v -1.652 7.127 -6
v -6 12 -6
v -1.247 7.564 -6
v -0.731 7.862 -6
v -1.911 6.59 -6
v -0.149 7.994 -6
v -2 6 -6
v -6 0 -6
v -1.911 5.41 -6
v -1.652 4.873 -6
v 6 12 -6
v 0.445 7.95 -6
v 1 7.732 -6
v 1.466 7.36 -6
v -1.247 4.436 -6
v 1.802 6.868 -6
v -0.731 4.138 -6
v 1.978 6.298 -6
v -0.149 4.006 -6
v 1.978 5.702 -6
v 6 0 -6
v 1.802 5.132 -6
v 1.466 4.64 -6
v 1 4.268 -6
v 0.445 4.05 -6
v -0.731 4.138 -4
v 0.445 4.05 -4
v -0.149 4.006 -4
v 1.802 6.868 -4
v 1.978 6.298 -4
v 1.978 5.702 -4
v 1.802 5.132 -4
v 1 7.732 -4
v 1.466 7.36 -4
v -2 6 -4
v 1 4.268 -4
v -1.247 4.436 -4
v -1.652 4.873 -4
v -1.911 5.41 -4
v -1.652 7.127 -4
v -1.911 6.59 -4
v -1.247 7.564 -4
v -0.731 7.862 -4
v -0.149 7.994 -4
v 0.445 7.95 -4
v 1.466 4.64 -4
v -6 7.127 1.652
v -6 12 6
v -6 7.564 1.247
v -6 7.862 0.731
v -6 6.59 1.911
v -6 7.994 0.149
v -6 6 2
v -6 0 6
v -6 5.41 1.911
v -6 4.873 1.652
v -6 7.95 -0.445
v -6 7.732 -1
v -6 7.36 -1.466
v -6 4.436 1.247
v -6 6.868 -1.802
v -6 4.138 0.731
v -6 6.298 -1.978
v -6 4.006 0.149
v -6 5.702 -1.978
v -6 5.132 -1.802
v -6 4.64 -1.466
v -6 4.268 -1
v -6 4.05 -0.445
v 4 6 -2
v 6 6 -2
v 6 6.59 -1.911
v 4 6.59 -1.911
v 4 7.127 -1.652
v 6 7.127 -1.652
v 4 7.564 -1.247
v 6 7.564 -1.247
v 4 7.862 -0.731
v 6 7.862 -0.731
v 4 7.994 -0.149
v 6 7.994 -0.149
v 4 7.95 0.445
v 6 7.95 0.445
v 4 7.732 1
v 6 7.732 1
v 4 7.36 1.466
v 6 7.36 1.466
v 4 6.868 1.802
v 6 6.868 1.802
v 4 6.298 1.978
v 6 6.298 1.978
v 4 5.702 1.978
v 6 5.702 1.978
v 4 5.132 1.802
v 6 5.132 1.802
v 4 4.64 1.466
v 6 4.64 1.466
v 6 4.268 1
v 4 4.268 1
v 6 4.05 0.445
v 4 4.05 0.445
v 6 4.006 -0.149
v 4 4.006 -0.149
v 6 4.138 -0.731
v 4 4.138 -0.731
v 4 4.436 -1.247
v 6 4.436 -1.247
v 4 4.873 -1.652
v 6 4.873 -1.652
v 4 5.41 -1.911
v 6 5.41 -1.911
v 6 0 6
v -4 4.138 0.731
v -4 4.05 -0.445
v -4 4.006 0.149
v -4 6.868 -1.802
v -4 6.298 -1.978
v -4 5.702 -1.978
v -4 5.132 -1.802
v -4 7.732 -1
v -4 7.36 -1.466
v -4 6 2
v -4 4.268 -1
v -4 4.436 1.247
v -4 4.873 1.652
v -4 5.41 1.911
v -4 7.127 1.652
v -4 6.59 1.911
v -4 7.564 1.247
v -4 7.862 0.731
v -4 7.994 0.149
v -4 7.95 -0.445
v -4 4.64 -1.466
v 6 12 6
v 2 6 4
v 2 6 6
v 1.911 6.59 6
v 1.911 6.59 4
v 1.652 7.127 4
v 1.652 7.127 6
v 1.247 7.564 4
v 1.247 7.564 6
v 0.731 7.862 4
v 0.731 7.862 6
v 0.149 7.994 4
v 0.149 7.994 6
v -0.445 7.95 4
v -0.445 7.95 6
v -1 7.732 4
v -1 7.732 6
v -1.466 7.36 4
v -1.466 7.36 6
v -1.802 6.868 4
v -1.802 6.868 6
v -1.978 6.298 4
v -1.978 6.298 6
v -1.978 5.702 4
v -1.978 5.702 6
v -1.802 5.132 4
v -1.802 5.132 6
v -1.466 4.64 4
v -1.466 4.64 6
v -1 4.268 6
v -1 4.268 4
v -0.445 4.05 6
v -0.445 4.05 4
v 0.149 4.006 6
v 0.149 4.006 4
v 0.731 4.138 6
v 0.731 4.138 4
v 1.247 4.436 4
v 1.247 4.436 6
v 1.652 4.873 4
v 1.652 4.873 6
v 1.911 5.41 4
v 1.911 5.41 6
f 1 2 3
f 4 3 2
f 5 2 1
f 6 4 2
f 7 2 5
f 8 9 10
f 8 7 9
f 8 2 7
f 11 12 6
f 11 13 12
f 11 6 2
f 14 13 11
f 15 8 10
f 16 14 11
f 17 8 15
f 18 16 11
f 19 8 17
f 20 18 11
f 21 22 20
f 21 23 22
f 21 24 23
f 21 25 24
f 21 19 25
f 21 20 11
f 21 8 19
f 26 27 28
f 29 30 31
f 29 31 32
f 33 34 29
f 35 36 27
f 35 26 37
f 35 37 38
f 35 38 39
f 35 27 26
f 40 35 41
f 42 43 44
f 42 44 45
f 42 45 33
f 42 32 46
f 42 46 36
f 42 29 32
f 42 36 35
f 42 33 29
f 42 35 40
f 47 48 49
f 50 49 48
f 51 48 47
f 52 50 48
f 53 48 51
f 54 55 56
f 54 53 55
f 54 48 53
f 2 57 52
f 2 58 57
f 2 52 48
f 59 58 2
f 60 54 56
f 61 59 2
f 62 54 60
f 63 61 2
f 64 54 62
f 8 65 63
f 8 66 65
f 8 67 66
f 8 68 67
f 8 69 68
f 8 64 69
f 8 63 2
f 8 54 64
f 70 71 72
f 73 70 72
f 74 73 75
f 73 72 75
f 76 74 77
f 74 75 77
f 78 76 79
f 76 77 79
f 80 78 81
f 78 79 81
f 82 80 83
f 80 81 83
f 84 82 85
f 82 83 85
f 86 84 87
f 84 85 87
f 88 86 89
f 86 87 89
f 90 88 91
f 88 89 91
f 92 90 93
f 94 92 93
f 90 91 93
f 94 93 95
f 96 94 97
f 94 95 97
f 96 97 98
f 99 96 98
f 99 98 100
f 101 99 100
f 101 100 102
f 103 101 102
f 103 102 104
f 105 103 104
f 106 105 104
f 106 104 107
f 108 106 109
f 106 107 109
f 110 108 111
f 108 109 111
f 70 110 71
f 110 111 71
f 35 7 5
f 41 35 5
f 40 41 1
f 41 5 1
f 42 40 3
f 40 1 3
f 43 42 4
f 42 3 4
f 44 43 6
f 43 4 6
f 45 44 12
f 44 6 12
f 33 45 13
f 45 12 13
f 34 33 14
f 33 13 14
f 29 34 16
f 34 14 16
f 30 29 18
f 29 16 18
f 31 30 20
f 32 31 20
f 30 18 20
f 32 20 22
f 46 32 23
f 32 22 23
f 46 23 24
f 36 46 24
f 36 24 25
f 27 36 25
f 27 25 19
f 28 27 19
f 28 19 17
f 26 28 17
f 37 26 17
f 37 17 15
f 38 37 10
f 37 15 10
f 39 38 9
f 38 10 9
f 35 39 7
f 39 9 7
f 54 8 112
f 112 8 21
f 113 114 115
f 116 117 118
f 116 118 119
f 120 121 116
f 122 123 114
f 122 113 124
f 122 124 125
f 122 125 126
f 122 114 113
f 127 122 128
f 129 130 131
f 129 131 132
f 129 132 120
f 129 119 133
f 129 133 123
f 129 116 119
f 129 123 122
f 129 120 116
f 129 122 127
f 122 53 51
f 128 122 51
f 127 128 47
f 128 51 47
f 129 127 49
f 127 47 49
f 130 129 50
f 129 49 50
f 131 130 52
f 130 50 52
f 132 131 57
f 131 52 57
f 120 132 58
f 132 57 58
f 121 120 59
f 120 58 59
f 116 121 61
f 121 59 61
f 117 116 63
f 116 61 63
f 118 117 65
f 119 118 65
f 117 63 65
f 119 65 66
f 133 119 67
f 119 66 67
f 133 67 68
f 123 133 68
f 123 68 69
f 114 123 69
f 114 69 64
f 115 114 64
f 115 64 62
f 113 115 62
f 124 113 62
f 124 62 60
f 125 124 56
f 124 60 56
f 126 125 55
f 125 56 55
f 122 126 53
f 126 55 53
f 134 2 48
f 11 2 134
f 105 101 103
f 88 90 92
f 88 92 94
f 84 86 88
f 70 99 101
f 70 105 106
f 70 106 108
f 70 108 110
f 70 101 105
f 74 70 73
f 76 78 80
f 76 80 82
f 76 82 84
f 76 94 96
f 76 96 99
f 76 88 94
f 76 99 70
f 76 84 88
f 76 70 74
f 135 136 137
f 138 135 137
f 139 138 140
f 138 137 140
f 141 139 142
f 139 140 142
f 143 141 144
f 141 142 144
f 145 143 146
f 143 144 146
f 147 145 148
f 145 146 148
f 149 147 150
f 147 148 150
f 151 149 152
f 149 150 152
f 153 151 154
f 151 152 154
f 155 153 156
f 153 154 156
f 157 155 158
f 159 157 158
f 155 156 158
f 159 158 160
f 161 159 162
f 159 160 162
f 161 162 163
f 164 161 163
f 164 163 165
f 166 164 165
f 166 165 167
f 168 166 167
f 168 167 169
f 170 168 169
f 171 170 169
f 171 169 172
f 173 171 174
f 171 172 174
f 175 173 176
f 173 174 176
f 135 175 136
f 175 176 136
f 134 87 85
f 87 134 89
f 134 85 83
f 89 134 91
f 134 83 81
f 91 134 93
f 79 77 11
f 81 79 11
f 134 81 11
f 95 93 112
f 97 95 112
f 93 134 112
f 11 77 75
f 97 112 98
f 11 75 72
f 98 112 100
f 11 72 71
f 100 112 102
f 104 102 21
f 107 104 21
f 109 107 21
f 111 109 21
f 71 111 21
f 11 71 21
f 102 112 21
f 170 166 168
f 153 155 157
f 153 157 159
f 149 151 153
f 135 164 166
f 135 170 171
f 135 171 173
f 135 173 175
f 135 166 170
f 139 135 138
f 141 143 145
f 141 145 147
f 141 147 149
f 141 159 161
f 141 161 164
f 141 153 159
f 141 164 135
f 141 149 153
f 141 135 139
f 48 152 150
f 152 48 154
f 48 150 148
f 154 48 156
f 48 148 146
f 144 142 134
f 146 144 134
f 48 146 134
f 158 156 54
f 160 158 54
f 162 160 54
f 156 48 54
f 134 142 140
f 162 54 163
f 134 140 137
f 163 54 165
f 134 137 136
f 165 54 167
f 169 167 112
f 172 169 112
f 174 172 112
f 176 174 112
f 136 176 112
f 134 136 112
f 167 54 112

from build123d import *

# Parameters (mm, degrees)
SKETCH_1_W               = 12
SKETCH_1_H               = 12
EXTRUDE_1_DEPTH          = 12
SKETCH_2_R               = 2
CUT_EXTRUDE_1_DEPTH      = 2
PATTERN_CIRCULAR_1_COUNT = 4


with BuildPart() as part:
    # 草圖1 → 填料-伸長1 (new body)
    with BuildSketch(Plane(origin=(0, 0, 0), x_dir=(1, 0, 0), z_dir=(0, 1, 0))):
        Rectangle(SKETCH_1_W, SKETCH_1_H)
    extrude(amount=EXTRUDE_1_DEPTH)

    # 草圖2 → 除料-伸長1 (cut)
    with BuildSketch(Plane.XY.offset(6)):
        with Locations((0, 6)):
            Circle(SKETCH_2_R)
    cut_extrude_1 = extrude(amount=-CUT_EXTRUDE_1_DEPTH, mode=Mode.SUBTRACT)

    # 環狀複製排列1: 除料-伸長1 ×4 about axis
    pattern_circular_1_axis = Axis((0, 12.6, 0), (0, -1, 0))
    for i in range(1, PATTERN_CIRCULAR_1_COUNT):
        add(cut_extrude_1.rotate(pattern_circular_1_axis, i * 360 / PATTERN_CIRCULAR_1_COUNT), mode=Mode.SUBTRACT)


solid = part.part
